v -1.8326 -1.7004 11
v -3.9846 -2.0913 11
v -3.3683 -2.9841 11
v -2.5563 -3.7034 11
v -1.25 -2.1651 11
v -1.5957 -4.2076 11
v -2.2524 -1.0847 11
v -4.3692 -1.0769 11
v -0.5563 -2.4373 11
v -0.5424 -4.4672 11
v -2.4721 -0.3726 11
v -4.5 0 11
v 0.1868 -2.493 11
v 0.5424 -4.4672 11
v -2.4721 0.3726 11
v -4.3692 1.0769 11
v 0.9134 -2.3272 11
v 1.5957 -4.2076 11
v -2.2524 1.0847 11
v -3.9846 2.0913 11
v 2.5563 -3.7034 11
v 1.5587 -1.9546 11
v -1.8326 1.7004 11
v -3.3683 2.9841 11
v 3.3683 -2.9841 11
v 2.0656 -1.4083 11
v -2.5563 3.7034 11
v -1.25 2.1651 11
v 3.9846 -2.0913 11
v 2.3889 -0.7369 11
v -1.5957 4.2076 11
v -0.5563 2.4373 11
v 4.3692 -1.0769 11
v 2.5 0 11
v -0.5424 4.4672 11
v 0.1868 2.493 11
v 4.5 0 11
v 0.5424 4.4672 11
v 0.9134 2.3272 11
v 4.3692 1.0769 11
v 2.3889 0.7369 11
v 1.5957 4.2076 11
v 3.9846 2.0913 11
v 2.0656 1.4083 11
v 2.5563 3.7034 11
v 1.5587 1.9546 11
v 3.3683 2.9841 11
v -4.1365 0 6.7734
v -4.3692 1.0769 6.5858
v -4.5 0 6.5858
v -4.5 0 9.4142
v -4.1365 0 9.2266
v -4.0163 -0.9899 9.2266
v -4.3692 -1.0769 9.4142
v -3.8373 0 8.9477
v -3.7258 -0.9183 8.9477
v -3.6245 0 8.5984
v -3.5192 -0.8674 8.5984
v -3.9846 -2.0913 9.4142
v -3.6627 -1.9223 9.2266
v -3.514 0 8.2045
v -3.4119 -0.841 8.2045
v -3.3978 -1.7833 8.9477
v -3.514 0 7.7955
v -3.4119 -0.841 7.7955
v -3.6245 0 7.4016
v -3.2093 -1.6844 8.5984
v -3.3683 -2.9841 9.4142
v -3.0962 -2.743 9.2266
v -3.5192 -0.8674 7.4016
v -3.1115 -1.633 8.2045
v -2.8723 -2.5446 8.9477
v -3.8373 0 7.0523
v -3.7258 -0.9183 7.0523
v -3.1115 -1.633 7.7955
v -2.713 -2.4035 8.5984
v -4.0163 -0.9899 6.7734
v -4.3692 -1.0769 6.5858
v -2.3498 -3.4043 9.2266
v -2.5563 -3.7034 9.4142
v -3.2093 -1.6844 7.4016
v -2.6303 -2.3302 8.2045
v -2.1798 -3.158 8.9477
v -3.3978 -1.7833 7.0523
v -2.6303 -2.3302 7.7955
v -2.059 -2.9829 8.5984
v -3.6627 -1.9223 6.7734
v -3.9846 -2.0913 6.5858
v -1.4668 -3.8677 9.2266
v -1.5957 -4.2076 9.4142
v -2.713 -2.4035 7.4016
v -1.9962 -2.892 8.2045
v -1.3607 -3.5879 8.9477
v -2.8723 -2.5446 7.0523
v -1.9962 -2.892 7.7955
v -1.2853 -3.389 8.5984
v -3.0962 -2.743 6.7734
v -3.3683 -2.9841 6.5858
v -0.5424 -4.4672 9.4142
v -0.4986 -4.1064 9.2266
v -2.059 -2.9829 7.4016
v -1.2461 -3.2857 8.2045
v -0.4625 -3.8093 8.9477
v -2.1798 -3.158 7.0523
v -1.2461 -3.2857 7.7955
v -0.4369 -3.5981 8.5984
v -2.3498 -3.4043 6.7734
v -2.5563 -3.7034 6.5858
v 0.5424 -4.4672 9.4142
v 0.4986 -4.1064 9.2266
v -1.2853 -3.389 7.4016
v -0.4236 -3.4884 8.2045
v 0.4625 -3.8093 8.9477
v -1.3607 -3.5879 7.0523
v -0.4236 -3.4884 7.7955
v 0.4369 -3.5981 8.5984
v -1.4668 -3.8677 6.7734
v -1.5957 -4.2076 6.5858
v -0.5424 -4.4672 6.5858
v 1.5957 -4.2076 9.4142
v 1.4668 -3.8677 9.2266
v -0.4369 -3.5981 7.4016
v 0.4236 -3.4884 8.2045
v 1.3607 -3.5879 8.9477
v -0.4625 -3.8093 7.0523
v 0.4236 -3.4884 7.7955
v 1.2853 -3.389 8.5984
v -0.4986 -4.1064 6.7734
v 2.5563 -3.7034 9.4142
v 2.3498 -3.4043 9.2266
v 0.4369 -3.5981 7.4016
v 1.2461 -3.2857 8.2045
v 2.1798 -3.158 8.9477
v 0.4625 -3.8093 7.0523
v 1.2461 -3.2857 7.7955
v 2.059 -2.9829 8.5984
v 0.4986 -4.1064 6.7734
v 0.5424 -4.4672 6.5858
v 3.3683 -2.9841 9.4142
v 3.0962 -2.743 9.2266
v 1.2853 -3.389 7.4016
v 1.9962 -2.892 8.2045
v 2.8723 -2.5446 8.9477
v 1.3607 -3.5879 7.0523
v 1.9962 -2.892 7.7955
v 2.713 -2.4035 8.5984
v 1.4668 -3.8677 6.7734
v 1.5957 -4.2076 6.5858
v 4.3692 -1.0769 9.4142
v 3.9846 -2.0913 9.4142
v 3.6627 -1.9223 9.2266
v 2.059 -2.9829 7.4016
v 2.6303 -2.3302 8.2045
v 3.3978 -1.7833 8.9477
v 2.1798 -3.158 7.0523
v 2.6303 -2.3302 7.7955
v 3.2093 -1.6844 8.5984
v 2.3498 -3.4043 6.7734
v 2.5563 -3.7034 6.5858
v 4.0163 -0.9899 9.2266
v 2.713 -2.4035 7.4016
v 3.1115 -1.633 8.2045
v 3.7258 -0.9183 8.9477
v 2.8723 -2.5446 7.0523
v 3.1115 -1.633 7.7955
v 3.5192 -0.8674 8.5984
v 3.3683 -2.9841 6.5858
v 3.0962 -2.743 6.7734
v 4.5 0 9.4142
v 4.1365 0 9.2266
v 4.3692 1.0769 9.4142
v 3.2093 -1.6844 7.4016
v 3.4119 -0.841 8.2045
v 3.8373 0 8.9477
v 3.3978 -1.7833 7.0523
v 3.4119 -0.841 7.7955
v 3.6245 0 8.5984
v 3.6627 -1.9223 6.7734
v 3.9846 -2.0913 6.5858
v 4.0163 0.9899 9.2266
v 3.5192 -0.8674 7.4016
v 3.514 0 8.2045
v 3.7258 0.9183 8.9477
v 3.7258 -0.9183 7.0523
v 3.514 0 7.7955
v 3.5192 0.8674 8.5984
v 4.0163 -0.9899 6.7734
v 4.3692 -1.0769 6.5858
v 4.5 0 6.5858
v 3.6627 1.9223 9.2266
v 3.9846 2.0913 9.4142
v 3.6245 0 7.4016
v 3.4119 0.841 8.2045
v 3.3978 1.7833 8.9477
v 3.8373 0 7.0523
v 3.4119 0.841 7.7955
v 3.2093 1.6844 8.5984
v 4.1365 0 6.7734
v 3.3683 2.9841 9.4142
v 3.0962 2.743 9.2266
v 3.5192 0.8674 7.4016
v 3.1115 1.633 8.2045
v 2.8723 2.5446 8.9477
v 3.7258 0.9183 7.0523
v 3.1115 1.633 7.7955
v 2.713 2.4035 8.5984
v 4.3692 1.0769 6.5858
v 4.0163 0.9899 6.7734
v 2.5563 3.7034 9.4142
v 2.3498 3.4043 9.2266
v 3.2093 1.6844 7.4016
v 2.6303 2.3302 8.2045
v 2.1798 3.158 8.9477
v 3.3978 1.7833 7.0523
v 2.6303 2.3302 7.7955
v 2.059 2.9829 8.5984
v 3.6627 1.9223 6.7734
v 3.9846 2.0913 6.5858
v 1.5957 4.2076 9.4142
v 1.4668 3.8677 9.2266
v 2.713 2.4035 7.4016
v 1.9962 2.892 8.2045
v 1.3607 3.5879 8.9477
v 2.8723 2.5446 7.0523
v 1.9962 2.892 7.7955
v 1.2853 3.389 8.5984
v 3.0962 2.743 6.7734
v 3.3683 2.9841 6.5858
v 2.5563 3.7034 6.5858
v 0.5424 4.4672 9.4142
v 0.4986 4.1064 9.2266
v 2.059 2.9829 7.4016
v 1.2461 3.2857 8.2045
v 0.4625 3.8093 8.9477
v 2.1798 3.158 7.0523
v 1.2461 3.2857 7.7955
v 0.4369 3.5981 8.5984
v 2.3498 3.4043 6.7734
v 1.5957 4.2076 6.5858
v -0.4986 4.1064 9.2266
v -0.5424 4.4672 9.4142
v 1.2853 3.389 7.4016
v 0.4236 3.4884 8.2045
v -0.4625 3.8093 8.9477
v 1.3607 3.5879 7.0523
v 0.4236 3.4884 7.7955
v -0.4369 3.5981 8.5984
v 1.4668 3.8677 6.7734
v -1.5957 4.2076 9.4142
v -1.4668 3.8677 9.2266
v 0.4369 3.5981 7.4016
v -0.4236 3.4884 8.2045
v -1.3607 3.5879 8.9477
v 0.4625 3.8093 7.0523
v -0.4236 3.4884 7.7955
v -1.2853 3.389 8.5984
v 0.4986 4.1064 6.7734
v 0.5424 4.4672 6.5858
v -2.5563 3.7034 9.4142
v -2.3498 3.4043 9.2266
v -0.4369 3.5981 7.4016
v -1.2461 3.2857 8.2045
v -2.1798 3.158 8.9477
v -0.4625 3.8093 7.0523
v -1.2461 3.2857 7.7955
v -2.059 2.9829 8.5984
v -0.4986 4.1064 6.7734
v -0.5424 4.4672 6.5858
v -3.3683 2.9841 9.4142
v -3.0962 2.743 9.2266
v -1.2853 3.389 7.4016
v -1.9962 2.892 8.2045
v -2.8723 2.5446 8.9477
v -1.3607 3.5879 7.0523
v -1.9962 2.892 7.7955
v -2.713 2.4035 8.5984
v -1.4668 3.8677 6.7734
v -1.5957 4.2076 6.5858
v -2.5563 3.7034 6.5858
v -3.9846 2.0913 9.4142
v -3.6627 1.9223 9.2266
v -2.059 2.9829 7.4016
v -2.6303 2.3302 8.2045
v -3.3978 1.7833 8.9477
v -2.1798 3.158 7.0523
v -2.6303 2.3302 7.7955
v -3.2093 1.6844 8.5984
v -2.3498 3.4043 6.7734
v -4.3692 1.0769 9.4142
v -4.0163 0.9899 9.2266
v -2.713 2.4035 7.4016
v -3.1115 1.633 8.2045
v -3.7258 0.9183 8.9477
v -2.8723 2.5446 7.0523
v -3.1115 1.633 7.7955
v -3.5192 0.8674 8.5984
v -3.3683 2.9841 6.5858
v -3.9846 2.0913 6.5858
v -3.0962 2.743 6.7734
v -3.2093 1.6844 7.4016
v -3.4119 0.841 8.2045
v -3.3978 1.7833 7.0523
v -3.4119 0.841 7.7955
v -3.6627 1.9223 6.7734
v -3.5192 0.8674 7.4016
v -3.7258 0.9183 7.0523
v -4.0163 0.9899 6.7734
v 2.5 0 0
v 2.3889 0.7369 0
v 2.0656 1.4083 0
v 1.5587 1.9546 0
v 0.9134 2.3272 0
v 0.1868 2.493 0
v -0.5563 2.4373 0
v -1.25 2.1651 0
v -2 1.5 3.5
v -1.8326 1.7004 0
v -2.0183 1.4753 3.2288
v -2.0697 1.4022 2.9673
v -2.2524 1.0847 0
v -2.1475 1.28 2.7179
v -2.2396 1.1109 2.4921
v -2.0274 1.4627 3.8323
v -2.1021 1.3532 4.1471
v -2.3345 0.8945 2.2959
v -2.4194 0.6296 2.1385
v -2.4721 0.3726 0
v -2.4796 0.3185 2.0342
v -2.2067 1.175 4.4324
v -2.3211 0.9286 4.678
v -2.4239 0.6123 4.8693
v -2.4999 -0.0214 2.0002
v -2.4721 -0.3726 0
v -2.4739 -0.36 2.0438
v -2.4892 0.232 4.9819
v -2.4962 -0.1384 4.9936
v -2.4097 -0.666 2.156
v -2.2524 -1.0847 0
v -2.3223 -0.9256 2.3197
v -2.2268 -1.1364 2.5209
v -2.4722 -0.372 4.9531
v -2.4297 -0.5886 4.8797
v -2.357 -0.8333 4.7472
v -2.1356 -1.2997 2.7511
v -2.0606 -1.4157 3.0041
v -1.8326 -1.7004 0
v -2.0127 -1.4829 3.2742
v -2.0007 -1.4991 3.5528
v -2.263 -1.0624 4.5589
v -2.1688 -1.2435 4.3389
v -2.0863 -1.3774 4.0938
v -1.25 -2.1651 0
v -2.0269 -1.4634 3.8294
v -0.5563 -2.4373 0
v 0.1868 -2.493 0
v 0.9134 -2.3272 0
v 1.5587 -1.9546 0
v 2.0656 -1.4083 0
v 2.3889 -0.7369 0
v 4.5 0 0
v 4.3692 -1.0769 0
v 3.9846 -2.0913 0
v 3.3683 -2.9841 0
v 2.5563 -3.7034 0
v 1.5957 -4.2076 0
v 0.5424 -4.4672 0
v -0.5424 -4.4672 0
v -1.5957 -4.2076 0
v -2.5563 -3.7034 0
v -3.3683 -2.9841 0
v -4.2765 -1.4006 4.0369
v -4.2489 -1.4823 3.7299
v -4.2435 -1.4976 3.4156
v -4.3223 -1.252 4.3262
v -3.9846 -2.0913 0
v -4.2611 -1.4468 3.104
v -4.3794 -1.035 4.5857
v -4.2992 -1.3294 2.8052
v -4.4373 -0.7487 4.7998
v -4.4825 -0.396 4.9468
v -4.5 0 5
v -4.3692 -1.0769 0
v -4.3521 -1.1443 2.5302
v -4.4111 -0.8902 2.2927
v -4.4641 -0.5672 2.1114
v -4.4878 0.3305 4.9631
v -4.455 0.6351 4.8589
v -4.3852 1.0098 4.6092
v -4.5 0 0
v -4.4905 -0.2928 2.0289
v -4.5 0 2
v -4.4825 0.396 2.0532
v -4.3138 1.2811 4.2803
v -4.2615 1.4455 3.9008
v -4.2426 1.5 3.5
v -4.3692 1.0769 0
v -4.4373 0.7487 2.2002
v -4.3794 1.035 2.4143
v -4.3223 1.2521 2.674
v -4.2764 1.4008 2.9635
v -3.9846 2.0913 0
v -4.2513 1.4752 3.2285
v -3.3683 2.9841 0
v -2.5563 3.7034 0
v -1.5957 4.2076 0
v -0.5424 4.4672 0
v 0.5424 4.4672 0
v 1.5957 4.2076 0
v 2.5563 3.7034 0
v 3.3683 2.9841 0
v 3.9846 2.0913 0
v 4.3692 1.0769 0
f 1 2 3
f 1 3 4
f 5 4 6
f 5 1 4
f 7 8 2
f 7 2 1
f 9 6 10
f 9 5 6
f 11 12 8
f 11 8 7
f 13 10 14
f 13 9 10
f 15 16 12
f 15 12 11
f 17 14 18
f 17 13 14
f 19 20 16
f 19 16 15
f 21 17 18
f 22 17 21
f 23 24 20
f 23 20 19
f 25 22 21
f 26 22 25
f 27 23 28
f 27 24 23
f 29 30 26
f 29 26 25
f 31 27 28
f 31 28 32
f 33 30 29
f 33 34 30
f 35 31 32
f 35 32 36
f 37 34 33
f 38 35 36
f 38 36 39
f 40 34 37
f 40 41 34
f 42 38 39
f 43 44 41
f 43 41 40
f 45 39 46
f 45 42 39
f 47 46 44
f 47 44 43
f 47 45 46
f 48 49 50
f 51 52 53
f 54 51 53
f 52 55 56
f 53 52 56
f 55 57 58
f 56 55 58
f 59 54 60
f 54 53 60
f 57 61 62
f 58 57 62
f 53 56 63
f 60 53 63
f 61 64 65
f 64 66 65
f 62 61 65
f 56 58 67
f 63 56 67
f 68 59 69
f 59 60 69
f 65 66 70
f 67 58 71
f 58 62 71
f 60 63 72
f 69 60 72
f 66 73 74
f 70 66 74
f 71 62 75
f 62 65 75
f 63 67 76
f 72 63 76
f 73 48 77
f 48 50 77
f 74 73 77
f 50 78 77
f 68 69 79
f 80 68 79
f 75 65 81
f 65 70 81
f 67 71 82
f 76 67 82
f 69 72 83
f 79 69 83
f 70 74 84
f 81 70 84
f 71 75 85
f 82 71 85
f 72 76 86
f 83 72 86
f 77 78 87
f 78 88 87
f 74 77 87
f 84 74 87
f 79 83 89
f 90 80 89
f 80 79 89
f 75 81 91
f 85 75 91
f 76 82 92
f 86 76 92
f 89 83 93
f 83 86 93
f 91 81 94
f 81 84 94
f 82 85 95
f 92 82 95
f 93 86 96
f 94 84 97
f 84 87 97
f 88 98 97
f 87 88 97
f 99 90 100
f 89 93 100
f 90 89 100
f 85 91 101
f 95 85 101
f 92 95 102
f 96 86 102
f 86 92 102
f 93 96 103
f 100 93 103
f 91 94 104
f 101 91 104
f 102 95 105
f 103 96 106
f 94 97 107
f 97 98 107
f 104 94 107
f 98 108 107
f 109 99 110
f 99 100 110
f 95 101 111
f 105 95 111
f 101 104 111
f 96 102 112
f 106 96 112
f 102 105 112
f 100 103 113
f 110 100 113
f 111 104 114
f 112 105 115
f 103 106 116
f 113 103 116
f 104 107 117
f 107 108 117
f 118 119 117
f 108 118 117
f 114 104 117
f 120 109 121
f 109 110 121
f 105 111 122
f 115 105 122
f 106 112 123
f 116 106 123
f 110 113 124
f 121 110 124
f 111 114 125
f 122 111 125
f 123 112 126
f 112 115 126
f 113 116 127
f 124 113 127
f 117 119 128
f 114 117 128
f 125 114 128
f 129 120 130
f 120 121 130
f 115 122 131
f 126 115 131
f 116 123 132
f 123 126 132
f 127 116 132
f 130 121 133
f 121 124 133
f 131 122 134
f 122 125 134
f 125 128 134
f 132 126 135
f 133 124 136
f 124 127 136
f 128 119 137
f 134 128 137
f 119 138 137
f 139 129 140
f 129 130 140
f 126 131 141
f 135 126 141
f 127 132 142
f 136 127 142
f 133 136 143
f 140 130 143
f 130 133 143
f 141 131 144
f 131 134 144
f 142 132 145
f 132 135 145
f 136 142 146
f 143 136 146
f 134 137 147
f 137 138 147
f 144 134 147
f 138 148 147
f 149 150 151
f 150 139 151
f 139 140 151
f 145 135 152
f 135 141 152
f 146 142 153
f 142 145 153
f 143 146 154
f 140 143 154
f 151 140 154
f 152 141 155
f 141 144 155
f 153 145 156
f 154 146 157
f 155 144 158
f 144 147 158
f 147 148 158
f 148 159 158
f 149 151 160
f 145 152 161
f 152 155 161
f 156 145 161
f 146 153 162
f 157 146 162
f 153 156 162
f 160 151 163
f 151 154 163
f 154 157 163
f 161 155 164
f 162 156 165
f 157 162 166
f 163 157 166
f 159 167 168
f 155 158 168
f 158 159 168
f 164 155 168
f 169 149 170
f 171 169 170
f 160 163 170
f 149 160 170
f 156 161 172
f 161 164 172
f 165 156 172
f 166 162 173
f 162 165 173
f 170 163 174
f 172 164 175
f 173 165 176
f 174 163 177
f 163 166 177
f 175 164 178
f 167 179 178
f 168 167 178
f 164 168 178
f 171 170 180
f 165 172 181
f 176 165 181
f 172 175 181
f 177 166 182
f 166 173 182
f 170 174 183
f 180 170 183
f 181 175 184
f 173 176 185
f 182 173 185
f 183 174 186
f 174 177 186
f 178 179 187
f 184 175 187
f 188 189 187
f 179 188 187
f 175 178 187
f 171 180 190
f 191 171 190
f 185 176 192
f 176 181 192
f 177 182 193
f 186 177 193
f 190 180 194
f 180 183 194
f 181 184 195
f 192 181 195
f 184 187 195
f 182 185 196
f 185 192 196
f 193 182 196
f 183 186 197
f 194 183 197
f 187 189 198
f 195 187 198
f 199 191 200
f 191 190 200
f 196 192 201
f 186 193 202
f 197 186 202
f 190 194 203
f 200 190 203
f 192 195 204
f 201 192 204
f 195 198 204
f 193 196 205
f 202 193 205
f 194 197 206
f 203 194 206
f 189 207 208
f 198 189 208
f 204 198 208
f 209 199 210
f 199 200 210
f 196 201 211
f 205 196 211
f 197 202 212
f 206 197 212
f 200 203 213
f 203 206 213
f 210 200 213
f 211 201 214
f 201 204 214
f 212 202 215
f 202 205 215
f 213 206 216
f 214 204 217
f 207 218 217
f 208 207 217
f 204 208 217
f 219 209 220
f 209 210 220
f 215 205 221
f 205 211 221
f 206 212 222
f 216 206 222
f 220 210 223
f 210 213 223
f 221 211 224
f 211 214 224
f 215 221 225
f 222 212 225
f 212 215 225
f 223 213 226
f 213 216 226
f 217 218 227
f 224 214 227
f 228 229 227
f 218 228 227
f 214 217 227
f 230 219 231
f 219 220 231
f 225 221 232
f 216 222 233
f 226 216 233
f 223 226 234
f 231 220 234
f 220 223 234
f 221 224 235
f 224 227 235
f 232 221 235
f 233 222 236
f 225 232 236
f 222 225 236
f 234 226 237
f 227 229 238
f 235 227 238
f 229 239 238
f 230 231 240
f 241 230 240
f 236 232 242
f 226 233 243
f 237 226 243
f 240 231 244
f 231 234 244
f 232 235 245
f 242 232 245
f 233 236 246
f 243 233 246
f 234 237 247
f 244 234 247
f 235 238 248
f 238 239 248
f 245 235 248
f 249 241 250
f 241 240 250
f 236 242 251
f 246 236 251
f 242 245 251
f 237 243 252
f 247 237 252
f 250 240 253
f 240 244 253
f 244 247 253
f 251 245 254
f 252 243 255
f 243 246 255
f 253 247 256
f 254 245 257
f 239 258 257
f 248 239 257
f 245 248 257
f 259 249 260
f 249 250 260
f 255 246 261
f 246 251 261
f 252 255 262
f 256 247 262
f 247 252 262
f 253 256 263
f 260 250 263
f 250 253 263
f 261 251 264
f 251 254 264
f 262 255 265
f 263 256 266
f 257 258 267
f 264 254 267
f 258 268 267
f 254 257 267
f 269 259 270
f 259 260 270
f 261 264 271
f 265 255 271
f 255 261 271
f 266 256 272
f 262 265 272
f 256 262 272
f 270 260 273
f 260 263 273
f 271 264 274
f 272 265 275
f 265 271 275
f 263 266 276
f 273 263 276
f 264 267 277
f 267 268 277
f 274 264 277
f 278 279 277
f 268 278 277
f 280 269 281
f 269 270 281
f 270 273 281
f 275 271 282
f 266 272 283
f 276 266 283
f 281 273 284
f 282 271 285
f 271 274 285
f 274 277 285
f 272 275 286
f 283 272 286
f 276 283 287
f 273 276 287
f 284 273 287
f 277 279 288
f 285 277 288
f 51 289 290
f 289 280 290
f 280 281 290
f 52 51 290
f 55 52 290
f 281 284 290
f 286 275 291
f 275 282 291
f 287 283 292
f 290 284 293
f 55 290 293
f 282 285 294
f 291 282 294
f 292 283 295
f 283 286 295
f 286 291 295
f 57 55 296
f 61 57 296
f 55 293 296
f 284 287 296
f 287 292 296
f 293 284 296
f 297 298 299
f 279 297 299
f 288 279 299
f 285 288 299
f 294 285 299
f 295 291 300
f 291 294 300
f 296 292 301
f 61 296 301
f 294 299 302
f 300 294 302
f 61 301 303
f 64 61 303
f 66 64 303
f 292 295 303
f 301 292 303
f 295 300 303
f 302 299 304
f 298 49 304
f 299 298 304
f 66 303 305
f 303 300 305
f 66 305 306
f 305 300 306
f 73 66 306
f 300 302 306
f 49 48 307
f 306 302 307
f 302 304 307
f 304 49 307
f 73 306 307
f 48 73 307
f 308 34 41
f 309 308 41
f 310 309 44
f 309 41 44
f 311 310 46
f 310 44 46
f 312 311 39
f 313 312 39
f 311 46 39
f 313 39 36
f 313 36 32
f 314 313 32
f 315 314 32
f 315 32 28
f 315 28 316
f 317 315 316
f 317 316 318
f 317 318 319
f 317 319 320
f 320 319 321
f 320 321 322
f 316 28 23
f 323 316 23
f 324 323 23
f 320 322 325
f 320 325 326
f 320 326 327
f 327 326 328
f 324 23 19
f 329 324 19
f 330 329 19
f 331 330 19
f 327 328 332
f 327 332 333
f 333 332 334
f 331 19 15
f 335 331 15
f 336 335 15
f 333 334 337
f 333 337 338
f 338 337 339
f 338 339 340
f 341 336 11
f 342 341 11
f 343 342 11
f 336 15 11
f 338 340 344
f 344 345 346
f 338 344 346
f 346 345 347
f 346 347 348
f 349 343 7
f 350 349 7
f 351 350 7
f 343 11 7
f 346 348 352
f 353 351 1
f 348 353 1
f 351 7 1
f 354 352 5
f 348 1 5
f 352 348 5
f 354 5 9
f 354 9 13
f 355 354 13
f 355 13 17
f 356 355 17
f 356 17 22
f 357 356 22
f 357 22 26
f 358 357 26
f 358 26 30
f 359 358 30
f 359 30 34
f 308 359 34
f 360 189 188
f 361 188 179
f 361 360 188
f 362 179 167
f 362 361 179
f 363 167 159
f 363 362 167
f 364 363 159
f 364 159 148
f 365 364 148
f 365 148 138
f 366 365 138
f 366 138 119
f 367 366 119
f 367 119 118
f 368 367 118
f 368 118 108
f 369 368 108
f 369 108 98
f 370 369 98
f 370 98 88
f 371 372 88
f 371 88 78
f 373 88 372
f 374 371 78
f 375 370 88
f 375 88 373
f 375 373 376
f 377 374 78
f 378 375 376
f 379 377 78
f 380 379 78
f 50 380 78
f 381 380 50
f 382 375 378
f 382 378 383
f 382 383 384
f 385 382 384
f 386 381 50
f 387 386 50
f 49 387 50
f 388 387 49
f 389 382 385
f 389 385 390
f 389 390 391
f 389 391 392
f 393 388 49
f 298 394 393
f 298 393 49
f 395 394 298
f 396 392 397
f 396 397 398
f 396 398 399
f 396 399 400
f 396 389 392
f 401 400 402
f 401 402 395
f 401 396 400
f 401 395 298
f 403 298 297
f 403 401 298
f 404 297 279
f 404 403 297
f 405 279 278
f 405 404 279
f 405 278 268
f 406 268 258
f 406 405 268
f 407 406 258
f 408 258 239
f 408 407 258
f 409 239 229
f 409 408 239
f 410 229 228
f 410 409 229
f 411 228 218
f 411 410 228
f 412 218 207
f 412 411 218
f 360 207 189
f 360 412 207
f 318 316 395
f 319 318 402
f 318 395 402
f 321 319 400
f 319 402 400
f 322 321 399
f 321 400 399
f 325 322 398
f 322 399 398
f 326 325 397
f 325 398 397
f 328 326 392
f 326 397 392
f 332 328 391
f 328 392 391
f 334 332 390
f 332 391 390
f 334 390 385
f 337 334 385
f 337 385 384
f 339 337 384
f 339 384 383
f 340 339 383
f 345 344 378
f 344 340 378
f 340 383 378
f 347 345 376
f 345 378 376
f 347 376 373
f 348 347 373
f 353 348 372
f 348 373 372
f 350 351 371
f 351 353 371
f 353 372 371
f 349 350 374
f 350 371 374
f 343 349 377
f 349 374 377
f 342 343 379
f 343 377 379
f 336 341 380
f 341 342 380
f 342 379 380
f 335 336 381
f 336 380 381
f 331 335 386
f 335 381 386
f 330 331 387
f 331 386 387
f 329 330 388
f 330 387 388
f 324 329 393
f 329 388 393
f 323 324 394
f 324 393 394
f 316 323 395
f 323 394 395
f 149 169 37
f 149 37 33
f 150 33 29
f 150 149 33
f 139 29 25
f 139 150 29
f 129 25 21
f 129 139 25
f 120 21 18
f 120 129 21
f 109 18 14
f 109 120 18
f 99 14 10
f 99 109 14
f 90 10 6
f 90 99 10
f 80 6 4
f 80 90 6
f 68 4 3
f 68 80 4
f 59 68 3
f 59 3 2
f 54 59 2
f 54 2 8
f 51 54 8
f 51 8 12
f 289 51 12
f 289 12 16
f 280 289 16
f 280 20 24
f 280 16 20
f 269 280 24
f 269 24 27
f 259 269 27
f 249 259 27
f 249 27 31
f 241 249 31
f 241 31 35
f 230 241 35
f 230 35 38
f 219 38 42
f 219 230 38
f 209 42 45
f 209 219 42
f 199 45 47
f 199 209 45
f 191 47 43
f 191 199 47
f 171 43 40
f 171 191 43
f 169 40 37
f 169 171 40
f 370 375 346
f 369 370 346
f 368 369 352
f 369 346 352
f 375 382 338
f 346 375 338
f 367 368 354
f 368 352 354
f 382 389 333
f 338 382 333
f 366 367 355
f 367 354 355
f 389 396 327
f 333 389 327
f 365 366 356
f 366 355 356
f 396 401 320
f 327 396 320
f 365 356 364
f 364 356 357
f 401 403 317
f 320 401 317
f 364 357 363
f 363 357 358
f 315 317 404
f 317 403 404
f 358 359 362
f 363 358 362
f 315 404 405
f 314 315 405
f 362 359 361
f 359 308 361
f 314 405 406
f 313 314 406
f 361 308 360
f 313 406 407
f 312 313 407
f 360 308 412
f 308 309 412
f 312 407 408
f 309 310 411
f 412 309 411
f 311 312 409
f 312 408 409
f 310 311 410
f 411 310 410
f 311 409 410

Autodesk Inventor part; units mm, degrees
ref_plane "XZ Plane" through (0, 0, 0) normal (0, 1, 0) x (-1, 0, 0)
ref_plane "XY Plane" through (0, 0, 0) normal (0, 0, 1) x (1, 0, 0)
sketch "Sketch1" plane through (0, 0, 0) normal (0, 0, 1) x (1, 0, 0)
  circle A0 centre (0, 0) radius 4.5
  dimension "d0" = 9
extrude "Extrusion1" add sketch "Sketch1" along normal blind 11
sketch "Sketch2" plane through (0, 0, 11) normal (0, 0, 1) x (1, 0, 0)
  circle A0 centre (0, 0) radius 4.5 projected
  circle A1 centre (0, 0) radius 2.5
  dimension "d3" = 5
extrude "Extrusion2" cut sketch "Sketch2" against normal up to next contours A1
ref_plane "Work Plane1" through (-4.5, 0, 0) normal (1, 0, 0) x (0, 1, 0)
sketch "Sketch3" plane through (-4.5, 0, 0) normal (1, 0, 0) x (0, 1, 0)
  circle A0 centre (0, 3.5) radius 1.5
  point P0 (0, 0)
  dimension "d6" = 3.5
  dimension "d7" = 3
extrude "Extrusion3" cut sketch "Sketch3" along normal up to next
thread "Thread1" size "M3x0.5" class "6H" standard "ANSI Metric M Profile" full length
sketch "Sketch4" plane through (0, 0, 0) normal (0, 1, 0) x (-1, 0, 0)
  line L0 (4.5, 0) -> (4.5, 11) projected
  circle A0 centre (5, 8) radius 1.5
  line L1 (0, 13.2) -> (0, -2.2) projected
  point P0 (0, 0)
  dimension "d12" = 3
  dimension "d13" = 0.5
  dimension "d14" = 8
revolve "Revolution1" cut sketch "Sketch4" angle 360 about axis through (0, 0, 11) along (0, 0, -1)
equation "\"d8\" = d7"
properties part number "DriveGearMK8" material "Aluminum 6061"
